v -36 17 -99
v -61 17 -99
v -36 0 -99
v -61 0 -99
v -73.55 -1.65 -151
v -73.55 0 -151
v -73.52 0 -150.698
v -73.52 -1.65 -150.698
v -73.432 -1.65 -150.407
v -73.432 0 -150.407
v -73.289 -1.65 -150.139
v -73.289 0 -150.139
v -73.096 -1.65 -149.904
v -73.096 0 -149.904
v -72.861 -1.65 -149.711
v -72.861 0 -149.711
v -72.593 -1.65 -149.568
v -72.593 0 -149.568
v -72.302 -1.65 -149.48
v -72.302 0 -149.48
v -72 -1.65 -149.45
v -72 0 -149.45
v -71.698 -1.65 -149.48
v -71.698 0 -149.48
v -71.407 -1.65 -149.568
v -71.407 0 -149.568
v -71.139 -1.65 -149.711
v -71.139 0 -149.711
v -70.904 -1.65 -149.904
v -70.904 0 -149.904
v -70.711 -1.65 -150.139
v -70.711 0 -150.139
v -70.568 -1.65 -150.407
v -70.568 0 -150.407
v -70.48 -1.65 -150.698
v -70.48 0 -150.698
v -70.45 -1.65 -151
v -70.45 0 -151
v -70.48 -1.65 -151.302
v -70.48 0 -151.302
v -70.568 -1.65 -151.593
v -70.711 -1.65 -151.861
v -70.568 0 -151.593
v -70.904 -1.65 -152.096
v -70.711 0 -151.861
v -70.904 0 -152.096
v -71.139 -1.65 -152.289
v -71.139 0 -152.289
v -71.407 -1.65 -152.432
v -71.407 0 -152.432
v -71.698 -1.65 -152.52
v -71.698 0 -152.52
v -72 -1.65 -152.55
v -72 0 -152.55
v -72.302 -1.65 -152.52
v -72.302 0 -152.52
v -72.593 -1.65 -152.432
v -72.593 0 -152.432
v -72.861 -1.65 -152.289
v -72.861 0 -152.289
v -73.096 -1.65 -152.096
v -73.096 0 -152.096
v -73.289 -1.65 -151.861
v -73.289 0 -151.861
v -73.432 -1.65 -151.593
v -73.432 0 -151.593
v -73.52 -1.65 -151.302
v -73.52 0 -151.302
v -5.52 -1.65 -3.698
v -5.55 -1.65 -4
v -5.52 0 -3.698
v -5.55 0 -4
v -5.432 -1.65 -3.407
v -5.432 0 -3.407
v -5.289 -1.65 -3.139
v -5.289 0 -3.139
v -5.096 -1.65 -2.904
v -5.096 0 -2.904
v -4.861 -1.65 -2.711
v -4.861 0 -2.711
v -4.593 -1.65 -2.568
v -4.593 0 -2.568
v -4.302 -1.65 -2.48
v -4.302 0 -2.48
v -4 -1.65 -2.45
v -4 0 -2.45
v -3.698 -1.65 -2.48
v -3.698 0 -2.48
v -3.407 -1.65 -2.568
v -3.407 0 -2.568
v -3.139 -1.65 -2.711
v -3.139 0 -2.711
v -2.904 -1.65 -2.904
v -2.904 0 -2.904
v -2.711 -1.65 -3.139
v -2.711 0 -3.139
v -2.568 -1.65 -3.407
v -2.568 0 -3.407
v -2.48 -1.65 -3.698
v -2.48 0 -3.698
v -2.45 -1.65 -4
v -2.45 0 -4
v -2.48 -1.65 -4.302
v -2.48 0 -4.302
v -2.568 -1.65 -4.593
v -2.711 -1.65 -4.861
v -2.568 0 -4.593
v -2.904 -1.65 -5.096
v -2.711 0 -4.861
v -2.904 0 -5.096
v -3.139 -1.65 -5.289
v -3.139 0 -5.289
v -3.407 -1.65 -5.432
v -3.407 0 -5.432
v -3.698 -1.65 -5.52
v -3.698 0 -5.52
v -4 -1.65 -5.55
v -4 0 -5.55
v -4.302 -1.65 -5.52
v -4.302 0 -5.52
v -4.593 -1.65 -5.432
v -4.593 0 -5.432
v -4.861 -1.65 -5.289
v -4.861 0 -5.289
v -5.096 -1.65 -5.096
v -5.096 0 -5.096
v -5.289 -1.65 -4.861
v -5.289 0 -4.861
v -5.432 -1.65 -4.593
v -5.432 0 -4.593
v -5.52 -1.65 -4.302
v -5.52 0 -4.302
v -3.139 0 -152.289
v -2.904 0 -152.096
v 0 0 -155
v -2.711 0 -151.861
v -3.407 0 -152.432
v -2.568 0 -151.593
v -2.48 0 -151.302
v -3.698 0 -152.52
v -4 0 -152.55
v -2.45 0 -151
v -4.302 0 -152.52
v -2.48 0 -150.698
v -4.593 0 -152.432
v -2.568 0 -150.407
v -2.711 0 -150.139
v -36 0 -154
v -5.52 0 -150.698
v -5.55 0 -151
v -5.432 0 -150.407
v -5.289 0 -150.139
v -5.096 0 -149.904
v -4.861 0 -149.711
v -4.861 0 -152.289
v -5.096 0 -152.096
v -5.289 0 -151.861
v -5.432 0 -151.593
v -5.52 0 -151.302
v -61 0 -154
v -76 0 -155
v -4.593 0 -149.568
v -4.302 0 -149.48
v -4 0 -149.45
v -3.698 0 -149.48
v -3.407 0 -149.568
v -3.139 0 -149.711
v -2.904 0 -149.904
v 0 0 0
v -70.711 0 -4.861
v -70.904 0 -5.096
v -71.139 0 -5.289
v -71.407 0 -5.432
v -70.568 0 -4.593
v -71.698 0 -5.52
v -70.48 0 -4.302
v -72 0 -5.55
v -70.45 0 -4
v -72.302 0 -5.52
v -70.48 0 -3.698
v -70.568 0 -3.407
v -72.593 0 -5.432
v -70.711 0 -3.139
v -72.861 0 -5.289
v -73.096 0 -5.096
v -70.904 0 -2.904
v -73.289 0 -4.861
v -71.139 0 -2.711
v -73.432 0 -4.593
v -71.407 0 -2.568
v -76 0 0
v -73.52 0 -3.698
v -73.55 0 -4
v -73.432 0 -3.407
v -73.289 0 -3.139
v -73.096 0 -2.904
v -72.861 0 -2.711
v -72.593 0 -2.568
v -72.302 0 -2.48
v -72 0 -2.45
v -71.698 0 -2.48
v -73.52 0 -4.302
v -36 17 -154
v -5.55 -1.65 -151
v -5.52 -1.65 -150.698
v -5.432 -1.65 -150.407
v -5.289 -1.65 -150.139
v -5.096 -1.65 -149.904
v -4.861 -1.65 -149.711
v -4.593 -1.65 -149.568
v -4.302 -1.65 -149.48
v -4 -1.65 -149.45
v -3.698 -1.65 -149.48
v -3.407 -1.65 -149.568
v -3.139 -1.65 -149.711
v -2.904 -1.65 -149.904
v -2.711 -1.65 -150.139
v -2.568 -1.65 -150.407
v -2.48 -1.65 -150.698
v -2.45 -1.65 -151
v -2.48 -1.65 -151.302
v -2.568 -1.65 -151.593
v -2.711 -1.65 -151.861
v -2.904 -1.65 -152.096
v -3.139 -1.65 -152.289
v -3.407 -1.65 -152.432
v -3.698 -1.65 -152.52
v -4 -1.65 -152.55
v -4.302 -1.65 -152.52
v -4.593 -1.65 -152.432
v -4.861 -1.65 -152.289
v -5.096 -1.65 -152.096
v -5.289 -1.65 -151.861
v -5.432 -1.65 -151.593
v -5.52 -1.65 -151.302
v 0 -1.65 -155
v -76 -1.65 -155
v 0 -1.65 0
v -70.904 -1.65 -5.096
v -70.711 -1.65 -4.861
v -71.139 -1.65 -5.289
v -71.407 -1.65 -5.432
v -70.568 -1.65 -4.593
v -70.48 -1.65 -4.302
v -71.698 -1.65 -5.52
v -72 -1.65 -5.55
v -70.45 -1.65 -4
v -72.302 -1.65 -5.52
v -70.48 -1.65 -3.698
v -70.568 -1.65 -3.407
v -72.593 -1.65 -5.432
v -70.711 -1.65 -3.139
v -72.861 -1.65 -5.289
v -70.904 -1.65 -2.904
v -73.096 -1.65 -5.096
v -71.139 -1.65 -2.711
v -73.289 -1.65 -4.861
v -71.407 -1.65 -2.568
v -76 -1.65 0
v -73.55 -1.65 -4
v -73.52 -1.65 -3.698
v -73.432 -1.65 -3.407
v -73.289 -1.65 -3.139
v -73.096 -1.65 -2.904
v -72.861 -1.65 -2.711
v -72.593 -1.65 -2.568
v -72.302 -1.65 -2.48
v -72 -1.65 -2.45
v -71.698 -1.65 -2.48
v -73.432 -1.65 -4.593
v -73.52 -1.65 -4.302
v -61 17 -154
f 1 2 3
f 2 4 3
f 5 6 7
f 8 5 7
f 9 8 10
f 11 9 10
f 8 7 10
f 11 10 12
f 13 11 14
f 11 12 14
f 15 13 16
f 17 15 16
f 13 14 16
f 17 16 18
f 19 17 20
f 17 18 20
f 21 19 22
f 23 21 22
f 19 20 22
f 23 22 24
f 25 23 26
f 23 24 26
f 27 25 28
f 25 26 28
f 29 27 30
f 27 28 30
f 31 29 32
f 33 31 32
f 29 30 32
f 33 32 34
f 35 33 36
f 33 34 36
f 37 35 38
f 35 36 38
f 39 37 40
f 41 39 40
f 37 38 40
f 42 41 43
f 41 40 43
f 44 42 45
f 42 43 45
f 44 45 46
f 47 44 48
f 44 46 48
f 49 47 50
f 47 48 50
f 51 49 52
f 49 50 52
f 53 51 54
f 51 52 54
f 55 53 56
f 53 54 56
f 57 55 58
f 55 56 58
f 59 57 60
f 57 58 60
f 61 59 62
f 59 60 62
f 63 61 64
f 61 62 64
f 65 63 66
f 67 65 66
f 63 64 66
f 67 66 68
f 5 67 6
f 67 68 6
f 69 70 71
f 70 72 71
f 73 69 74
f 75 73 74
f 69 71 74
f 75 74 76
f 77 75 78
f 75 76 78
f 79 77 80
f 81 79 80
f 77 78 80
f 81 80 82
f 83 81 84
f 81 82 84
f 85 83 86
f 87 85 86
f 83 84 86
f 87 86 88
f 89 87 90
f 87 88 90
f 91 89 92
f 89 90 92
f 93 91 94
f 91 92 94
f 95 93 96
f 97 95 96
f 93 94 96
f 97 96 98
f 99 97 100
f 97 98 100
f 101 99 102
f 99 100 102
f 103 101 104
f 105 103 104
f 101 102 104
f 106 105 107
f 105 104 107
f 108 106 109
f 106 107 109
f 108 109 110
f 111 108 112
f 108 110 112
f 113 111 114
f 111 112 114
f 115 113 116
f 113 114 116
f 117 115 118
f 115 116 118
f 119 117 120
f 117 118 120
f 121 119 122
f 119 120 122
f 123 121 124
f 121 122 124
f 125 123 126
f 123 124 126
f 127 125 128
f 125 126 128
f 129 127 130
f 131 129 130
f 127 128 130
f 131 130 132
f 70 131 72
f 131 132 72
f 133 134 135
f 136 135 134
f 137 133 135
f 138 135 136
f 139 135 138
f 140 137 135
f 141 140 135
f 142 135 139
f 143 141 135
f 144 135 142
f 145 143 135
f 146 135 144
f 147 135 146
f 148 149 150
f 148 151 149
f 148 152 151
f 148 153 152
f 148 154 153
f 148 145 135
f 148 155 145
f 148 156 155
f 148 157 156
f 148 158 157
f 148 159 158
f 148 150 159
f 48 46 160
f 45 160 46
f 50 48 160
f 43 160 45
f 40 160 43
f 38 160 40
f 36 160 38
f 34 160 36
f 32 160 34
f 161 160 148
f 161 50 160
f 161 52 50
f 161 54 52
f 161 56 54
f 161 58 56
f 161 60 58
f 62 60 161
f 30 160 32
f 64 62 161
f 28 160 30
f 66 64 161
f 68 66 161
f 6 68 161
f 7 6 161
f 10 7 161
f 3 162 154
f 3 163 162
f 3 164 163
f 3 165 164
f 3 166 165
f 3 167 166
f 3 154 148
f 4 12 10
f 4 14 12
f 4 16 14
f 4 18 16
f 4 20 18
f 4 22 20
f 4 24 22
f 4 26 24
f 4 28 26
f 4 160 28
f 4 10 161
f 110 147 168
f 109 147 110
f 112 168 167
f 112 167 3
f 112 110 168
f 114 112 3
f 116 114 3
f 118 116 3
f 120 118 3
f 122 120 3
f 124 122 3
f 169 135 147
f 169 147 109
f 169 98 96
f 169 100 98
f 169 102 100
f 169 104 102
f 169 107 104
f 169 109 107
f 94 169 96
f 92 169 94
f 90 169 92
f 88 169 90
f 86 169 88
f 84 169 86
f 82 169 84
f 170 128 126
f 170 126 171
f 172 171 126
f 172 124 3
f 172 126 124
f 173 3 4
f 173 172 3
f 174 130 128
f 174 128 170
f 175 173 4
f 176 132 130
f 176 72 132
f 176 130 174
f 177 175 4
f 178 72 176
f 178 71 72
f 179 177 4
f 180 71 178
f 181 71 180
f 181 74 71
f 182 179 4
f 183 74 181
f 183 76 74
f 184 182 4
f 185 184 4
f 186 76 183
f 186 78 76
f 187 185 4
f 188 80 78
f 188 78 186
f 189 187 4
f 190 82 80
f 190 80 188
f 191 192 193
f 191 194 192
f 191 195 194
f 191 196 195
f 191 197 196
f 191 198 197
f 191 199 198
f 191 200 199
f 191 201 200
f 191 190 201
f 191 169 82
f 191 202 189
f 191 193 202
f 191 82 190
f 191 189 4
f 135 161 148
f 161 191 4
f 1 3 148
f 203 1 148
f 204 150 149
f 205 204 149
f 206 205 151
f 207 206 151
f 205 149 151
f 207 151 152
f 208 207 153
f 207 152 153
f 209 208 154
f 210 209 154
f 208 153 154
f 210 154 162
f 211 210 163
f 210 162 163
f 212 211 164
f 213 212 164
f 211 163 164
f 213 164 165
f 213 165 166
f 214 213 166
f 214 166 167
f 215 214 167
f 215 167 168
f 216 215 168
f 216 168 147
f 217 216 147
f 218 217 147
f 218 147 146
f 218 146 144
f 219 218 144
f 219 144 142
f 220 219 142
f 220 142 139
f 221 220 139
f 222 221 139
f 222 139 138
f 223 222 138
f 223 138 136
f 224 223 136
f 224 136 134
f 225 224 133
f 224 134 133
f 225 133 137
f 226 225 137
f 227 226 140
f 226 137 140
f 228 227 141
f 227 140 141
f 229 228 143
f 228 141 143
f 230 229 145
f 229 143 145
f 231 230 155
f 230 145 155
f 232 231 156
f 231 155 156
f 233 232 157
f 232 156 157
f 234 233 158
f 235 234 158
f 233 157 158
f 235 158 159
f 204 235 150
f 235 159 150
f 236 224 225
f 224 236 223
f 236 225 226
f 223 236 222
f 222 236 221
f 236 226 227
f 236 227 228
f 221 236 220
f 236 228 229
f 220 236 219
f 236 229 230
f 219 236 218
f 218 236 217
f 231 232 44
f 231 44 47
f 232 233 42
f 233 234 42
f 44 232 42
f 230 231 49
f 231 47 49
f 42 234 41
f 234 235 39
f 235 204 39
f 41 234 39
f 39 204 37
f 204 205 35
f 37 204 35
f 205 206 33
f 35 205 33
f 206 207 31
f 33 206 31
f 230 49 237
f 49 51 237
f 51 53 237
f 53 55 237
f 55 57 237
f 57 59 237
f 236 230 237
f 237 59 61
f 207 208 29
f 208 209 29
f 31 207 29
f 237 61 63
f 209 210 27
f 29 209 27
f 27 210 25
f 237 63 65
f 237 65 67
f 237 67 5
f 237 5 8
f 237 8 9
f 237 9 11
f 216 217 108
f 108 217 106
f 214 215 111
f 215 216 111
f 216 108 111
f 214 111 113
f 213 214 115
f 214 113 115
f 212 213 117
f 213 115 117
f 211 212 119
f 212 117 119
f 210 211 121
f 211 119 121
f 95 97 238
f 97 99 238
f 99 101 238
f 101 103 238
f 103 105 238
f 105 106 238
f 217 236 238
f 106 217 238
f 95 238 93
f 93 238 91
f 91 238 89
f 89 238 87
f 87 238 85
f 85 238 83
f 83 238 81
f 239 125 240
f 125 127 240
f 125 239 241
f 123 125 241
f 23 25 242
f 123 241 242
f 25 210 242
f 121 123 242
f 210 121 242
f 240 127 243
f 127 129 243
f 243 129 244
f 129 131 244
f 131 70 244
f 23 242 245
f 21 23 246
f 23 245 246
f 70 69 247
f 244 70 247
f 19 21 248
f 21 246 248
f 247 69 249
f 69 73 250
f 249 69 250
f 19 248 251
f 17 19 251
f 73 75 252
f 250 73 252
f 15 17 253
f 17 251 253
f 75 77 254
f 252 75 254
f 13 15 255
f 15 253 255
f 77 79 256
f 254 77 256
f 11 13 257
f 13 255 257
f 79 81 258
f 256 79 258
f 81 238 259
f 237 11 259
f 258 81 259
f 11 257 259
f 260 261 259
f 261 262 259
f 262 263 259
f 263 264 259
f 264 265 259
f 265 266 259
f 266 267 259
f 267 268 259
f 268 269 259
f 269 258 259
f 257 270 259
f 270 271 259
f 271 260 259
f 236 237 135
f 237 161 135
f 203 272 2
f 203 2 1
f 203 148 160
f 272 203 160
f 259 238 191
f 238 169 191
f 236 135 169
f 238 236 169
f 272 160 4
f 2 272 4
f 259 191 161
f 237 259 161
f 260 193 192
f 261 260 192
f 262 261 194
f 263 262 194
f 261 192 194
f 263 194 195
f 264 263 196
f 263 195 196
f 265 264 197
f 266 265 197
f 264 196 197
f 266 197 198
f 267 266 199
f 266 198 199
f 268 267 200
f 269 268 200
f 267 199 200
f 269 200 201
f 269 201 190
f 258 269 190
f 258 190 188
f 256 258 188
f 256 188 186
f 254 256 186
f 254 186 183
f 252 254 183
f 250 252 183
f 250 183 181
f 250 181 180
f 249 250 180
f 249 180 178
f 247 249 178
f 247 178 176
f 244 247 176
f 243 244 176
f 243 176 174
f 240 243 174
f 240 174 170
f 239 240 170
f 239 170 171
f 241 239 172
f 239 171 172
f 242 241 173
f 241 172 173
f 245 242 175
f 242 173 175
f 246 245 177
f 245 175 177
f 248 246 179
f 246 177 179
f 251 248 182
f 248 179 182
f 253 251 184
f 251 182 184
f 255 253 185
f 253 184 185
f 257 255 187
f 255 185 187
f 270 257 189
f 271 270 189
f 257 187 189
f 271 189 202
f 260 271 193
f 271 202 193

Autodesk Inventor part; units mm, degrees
ref_plane "YZ Plane" through (0, 0, 0) normal (1, 0, 0) x (0, 1, 0)
ref_plane "XZ Plane" through (0, 0, 0) normal (0, 1, 0) x (-1, 0, 0)
ref_plane "XY Plane" through (0, 0, 0) normal (0, 0, 1) x (1, 0, 0)
sketch "Sketch1" plane through (0, 0, 0) normal (0, 1, 0) x (-1, 0, 0)
  line L0 (0, 0) -> (76, 0)
  line L1 (76, 0) -> (76, -155)
  line L2 (76, -155) -> (0, -155)
  line L3 (0, -155) -> (0, 0)
  line L4 (81.1574, -77.5) -> (-13.3813, -77.5) construction
  line L5 (38, 8.4809) -> (38, -161.1275) construction
  line L6 (4, -151) -> (72, -151) construction
  line L7 (72, -151) -> (72, -4) construction
  line L8 (72, -4) -> (4, -4) construction
  line L9 (4, -4) -> (4, -151) construction
  line L10 (4, -151) -> (72, -4) construction
  line L11 (72, -151) -> (4, -4) construction
  circle A0 centre (72, -4) radius 1.55
  circle A1 centre (72, -151) radius 1.55
  circle A2 centre (4, -151) radius 1.55
  circle A3 centre (4, -4) radius 1.55
  point P0 (76, -77.5)
  point P1 (38, -155)
  point P2 (38, -77.5)
  dimension "d0" = 76
  dimension "d1" = 155
  dimension "d2" = 68
  dimension "d3" = 147
  dimension "d4" = 3.1
  dimension "d5" = 3.1
  dimension "d6" = 3.1
  dimension "d7" = 3.1
extrude "Extrusion1" add sketch "Sketch1" against normal blind 1.65
sketch "Sketch2" plane through (0, 0, 0) normal (0, 1, 0) x (1, 0, 0)
  line L0 (-61, 99) -> (-36, 99)
  line L1 (-36, 99) -> (-36, 154)
  line L2 (-36, 154) -> (-61, 154)
  line L3 (-61, 154) -> (-61, 99)
  line L4 (0, 155) -> (-76, 155) projected
  line L5 (-76, 155) -> (-76, 0) projected
  point P0 (0, 0)
  dimension "d10" = 25
  dimension "d11" = 55
  dimension "d12" = 56
  dimension "d13" = 40
extrude "Extrusion2" add sketch "Sketch2" along normal blind 17
properties part number "Coms Board V1"
